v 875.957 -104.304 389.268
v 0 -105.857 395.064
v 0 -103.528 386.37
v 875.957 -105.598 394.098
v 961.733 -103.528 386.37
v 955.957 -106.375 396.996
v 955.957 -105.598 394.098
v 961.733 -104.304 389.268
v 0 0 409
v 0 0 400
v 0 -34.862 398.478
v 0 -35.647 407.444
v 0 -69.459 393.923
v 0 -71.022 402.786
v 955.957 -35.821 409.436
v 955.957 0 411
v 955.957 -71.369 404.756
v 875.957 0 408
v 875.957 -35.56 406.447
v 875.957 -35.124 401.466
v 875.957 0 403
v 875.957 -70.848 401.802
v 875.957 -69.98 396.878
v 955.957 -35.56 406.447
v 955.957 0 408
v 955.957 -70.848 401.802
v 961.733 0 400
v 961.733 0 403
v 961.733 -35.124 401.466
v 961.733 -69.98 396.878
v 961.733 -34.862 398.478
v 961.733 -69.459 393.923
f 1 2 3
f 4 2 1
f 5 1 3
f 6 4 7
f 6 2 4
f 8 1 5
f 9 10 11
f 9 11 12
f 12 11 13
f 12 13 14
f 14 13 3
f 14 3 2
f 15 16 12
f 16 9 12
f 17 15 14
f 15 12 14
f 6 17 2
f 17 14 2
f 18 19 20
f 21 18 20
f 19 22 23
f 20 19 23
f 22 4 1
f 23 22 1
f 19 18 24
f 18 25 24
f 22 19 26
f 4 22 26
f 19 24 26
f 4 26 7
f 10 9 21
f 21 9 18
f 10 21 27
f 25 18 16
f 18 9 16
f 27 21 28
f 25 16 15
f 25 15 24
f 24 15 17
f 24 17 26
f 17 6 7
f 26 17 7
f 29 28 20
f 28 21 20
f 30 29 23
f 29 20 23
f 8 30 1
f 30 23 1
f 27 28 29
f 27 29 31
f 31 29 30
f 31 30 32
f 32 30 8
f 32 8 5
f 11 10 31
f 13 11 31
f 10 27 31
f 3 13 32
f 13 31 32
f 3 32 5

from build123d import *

# Parameters (mm, degrees)
F1_ANGLE = 15


with BuildPart() as f1:
    # F0 (on Front) → F1 (revolve)
    with BuildSketch(Plane.XZ):
        Polygon((955.956617, 411), (0, 409), (0, 400), (961.732832, 400), (961.732832, 403), (875.956617, 403), (875.956617, 408), (955.956617, 408), align=None)
    revolve(axis=Axis((-114.079464, 0, 0), (1, 0, 0)), revolution_arc=F1_ANGLE)


solid = f1.part
